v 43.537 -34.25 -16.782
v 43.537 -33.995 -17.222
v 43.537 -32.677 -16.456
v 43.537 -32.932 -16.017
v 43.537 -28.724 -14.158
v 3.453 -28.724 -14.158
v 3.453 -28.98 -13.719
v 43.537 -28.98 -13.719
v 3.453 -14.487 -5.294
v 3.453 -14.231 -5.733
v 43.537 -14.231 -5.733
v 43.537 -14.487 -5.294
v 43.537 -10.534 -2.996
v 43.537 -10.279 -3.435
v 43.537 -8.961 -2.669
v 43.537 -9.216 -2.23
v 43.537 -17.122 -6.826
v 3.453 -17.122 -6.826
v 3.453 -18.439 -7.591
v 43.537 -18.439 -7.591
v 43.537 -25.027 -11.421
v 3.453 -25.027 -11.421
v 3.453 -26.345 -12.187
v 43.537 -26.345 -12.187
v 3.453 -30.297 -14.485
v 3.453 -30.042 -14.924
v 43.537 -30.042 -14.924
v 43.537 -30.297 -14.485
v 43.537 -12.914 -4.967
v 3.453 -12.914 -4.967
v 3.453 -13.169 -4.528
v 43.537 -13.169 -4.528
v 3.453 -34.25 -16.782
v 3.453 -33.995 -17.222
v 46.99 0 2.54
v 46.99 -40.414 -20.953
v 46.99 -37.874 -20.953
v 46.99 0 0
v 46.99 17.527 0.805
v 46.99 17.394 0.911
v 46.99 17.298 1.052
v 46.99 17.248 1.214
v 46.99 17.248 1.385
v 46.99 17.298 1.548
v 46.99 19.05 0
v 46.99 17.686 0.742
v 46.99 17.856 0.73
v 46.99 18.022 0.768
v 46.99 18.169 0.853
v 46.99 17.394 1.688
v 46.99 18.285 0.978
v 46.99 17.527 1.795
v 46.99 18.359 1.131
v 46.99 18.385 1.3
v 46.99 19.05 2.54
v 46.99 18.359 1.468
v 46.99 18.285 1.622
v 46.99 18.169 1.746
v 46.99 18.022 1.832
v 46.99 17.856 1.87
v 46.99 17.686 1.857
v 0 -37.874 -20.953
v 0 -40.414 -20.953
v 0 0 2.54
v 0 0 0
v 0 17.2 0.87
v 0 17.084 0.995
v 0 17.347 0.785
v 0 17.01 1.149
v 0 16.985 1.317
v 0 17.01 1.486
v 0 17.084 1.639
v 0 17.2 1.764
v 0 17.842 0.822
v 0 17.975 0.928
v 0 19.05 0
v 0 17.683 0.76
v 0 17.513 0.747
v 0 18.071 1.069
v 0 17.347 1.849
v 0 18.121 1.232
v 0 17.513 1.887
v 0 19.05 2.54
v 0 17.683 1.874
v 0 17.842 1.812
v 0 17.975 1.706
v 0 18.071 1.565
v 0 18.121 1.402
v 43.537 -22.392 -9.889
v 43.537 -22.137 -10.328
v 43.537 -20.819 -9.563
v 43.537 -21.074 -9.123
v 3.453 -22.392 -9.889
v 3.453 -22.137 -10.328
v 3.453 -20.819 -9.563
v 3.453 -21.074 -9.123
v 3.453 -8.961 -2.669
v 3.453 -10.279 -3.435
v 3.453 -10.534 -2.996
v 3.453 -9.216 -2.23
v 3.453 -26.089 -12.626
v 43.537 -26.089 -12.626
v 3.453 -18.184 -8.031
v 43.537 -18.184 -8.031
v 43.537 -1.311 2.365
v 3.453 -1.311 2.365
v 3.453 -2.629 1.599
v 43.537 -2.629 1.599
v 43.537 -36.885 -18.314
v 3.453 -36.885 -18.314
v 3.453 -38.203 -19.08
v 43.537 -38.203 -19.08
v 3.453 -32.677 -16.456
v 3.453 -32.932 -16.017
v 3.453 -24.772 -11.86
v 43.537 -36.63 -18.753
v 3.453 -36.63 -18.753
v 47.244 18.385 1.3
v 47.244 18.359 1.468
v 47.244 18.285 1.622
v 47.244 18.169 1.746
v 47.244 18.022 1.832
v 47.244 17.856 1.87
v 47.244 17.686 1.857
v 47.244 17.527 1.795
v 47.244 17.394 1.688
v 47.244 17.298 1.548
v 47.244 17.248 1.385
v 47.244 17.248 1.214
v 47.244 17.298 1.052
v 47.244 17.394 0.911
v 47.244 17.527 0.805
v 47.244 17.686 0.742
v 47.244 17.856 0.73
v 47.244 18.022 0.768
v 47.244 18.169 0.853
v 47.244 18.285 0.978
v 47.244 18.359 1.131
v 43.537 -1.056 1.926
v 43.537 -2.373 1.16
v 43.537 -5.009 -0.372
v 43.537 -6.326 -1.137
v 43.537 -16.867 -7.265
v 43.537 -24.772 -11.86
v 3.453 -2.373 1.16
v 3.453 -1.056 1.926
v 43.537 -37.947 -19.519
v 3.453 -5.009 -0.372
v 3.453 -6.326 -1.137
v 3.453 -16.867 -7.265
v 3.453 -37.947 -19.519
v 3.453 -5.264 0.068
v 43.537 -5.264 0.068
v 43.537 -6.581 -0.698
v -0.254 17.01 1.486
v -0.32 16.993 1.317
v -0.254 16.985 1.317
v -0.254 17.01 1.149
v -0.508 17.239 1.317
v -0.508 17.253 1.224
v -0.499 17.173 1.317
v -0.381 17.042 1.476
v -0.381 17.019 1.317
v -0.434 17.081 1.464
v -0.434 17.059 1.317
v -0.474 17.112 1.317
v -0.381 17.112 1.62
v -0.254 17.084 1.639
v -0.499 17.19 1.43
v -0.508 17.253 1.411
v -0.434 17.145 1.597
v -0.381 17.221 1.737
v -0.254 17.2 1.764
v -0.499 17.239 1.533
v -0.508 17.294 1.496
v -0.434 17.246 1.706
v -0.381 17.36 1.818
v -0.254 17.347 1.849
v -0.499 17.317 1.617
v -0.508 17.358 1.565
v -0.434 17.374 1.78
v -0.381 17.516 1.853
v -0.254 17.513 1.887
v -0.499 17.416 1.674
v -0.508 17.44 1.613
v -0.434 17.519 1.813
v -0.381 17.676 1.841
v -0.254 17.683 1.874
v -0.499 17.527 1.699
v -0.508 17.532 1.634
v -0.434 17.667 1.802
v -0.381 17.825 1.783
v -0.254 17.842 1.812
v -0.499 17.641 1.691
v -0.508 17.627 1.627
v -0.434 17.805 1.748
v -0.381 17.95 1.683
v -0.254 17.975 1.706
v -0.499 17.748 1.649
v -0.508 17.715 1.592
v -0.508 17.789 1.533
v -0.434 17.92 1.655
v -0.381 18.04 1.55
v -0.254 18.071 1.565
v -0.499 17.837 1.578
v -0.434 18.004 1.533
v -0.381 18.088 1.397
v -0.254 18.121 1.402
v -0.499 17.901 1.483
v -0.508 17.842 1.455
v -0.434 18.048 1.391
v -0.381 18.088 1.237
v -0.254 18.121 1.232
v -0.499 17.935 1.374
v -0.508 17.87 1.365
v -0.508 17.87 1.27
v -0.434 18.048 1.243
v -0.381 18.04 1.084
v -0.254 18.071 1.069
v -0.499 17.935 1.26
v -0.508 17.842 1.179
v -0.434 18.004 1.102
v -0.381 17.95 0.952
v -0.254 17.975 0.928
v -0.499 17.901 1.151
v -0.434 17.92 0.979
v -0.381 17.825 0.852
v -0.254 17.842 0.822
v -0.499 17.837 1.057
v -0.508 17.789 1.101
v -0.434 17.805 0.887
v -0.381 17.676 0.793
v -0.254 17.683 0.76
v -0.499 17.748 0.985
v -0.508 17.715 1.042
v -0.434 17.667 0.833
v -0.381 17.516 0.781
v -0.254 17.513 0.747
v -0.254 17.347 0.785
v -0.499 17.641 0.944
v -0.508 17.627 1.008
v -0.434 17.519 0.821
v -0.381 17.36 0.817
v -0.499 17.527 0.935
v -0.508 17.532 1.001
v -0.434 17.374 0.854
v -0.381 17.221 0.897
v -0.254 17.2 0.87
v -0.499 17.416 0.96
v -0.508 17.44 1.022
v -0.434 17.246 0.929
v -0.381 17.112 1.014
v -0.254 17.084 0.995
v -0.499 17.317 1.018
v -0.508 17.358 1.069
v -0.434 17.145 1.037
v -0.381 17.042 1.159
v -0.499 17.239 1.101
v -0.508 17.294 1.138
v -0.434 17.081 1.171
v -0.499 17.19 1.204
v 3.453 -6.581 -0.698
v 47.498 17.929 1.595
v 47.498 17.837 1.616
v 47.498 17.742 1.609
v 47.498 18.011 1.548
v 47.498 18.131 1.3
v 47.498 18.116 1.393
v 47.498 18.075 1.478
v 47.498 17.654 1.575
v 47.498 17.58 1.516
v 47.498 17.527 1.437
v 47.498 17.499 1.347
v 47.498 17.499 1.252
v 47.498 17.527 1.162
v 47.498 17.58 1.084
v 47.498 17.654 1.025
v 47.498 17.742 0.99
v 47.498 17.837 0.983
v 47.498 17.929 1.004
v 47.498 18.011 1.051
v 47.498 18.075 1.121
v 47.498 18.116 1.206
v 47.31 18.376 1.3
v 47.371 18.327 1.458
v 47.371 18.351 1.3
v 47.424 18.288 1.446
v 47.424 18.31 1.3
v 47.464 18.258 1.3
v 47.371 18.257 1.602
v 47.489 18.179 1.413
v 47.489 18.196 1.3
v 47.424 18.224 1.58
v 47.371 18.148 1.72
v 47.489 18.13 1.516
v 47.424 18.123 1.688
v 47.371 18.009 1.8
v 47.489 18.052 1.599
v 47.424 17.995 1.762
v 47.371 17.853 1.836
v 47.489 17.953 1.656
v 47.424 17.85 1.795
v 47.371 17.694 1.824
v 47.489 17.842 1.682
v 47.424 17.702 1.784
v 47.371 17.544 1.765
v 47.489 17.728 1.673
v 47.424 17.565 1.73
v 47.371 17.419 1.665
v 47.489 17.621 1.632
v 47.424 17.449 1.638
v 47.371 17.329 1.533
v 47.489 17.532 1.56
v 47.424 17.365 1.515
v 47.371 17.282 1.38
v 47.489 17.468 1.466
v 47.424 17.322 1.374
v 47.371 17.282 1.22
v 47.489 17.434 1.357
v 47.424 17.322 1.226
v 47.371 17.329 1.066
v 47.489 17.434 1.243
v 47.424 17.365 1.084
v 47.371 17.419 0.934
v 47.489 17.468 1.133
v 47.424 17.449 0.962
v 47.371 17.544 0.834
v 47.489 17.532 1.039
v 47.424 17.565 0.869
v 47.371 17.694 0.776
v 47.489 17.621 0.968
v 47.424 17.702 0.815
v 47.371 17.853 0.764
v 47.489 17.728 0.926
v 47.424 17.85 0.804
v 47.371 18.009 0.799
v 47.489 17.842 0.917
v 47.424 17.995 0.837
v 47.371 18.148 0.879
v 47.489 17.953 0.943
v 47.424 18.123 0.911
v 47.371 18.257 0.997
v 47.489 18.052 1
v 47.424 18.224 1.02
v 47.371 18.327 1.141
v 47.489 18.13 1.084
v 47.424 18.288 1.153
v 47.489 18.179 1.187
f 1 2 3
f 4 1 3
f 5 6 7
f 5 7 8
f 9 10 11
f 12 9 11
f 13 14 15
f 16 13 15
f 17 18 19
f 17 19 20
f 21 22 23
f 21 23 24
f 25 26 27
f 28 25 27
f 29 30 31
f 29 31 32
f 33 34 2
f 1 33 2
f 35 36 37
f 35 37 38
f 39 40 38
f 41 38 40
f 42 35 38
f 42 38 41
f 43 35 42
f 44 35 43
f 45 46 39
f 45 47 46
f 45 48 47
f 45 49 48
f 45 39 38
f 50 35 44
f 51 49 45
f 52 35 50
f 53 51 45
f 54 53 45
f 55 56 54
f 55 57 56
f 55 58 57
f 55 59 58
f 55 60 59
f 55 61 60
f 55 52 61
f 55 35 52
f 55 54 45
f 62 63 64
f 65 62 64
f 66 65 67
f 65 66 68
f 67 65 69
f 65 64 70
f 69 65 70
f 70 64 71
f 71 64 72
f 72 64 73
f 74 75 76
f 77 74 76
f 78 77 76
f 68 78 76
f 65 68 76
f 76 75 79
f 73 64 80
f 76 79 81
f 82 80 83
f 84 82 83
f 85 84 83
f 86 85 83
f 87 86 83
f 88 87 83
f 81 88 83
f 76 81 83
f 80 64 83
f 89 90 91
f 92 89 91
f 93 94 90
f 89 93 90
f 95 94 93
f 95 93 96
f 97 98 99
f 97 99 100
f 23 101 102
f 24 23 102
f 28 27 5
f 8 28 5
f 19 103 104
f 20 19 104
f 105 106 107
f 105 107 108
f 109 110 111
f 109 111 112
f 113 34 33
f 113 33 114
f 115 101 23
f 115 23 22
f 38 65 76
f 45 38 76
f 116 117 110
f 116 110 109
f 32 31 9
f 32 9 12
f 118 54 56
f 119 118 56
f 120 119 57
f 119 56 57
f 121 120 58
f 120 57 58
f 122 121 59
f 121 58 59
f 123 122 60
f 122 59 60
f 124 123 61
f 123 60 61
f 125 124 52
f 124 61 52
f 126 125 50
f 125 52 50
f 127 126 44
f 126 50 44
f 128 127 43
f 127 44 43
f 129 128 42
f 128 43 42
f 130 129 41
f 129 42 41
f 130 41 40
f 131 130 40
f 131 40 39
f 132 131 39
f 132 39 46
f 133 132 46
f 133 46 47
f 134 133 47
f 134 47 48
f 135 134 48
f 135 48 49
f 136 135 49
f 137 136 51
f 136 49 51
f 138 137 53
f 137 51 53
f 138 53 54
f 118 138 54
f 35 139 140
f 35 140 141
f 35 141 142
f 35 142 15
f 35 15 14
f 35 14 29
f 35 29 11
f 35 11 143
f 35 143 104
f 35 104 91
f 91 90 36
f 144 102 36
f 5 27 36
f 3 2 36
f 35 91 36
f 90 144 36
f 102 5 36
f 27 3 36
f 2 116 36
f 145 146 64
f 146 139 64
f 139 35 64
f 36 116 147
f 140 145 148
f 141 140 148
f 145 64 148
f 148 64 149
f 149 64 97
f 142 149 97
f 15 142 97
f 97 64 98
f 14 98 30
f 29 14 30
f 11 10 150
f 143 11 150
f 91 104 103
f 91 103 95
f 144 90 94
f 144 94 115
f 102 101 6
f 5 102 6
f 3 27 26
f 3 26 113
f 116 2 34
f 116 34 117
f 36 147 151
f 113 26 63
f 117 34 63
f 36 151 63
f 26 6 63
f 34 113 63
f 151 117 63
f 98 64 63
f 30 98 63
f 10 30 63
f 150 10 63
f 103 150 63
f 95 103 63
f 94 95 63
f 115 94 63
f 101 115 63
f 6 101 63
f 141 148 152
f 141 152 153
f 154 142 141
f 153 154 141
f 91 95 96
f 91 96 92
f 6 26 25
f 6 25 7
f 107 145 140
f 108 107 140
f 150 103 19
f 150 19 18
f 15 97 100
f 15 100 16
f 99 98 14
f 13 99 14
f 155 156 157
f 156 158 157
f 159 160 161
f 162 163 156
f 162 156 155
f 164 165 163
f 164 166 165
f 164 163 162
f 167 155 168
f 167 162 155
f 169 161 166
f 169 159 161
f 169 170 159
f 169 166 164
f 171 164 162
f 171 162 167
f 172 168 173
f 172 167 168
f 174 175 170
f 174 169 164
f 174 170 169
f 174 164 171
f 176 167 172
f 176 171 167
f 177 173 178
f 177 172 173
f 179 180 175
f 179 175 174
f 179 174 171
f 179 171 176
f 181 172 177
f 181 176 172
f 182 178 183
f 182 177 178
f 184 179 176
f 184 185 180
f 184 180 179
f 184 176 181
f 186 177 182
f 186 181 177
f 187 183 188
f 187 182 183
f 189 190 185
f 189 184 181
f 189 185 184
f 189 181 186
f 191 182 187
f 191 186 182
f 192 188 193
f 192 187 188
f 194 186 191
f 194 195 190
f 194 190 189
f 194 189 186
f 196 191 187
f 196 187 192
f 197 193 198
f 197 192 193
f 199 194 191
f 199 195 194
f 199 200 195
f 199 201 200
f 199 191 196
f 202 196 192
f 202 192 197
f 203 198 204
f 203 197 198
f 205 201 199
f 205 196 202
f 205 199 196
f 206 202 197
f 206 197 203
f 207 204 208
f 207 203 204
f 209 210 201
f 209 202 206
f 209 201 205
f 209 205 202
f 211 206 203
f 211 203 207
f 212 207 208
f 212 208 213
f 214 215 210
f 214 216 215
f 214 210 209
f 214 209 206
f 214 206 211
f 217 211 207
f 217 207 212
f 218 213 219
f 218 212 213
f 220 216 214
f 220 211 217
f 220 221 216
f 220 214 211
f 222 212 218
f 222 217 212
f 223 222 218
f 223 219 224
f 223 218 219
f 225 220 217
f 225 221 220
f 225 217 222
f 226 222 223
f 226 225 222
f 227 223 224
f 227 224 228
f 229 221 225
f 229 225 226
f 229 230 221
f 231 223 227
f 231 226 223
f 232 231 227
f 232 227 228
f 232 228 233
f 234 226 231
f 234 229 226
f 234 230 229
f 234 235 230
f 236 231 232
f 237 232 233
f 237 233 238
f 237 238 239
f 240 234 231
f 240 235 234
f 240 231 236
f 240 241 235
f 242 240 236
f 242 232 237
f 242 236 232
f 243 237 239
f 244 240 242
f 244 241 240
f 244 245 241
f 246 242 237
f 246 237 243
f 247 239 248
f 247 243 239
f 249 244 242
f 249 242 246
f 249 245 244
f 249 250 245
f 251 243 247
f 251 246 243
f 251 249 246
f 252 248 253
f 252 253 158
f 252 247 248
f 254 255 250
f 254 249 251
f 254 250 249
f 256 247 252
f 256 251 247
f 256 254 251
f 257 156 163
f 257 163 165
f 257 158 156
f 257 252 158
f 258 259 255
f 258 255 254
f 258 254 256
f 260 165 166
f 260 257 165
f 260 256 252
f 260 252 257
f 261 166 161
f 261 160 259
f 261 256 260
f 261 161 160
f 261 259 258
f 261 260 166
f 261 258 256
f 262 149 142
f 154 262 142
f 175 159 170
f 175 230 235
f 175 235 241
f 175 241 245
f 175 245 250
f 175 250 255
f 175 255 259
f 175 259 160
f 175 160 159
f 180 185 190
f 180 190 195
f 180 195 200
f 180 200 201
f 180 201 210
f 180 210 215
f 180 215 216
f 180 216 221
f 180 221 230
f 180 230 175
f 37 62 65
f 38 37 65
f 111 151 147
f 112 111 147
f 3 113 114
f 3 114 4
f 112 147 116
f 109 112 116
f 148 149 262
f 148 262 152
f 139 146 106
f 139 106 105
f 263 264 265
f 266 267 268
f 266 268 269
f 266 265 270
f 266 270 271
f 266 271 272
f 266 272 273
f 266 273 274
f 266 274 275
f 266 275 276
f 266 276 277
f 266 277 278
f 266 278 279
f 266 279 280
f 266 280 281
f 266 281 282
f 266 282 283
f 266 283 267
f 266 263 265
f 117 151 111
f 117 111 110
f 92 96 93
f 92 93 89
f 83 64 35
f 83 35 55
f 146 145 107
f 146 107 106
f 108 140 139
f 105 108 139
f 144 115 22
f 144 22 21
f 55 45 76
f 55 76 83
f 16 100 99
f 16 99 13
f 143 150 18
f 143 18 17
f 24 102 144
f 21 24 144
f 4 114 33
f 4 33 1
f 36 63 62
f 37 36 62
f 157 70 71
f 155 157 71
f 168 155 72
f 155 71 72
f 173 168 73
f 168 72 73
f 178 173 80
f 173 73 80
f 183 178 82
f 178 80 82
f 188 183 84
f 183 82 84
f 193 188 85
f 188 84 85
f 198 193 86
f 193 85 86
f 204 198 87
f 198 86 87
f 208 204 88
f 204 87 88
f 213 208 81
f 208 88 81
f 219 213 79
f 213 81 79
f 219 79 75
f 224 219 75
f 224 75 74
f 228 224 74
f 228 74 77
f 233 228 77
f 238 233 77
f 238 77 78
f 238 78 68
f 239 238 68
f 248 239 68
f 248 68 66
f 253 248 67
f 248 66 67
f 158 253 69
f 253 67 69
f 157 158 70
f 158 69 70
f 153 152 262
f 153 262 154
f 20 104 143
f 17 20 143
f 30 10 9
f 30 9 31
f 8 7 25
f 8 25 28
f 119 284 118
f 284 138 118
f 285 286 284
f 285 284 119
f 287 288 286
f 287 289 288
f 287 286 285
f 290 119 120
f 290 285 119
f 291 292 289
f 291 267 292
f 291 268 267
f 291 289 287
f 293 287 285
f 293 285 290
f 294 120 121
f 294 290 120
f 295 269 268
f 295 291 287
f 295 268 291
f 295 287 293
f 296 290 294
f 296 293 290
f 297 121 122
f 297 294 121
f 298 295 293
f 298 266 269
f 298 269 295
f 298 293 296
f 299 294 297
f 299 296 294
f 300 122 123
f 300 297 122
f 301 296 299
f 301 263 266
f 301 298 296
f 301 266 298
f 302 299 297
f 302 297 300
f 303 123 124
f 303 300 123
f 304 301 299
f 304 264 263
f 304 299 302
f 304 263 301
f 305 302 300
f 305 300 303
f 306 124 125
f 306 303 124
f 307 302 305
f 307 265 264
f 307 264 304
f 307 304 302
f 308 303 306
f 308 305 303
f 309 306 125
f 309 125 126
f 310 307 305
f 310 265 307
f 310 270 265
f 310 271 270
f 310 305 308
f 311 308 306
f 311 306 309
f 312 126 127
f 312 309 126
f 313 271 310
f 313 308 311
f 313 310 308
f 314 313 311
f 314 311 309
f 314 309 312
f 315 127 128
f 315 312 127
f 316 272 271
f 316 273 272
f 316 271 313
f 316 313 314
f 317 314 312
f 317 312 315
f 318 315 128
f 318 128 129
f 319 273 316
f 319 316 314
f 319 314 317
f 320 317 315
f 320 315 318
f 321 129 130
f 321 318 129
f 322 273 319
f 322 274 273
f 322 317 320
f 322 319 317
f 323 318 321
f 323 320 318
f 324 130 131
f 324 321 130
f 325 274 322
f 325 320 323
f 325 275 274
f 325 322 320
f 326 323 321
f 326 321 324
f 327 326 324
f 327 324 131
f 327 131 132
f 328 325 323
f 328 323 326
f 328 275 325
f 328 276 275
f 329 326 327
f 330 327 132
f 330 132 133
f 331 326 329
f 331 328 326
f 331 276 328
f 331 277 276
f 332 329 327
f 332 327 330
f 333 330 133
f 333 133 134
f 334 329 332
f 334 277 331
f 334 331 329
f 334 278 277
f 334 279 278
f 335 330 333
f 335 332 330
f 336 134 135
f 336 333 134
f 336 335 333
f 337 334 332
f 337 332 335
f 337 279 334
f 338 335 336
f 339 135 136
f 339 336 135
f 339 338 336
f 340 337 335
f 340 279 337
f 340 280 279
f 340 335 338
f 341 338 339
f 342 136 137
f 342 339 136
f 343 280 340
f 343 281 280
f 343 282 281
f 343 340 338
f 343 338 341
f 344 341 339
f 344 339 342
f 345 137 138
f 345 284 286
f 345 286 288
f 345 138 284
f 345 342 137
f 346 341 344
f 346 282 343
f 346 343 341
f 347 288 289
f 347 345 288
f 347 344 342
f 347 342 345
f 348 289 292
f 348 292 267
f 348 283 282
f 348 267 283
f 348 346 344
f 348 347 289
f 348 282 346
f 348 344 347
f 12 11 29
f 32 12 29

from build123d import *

# Parameters (mm, degrees)
F0_W     = 19.05
F0_H     = 2.54
F1_DEPTH = 46.99
F2_W     = 40.0845290253
F2_H     = 1.524
F3_DEPTH = 0.508
F4_R     = 0.57150051
F5_DEPTH = 0.508
F6_R     = 0.254
F7_R     = 0.5715
F8_DEPTH = 0.508
F9_R     = 0.254


with BuildPart() as f1:
    # F0 (on Right) → F1 (new body)
    with BuildSketch(Plane.YZ):
        with Locations((9.525, 1.27)):
            Rectangle(F0_W, F0_H)
        Polygon((0, 0), (0, 2.54), (-40.4138714075, -20.9532231092), (-37.8738714075, -20.9532231092), align=None)
    extrude(amount=F1_DEPTH)

    # F2 (on face) → F3 (join)
    with BuildSketch(Plane(origin=(0, -1.1036035582, 1.8984577841), x_dir=(1, 0, 0), z_dir=(0, -0.5025690754, 0.8645370579))):
        with Locations((23.495, -0.7067697006)):
            Rectangle(F2_W, F2_H)
        with Locations((23.495, -5.2787697006)):
            Rectangle(F2_W, F2_H)
        with Locations((23.495, -9.8507697006)):
            Rectangle(F2_W, F2_H)
        with Locations((23.495, -14.4227697006)):
            Rectangle(F2_W, F2_H)
        with Locations((23.495, -18.9947697006)):
            Rectangle(F2_W, F2_H)
        with Locations((23.495, -23.5667697006)):
            Rectangle(F2_W, F2_H)
        with Locations((23.495, -28.1387697006)):
            Rectangle(F2_W, F2_H)
        with Locations((23.495, -32.7107697006)):
            Rectangle(F2_W, F2_H)
        with Locations((23.495, -37.2827697006)):
            Rectangle(F2_W, F2_H)
        with Locations((23.495, -41.8547697006)):
            Rectangle(F2_W, F2_H)
    extrude(amount=F3_DEPTH)

    # F4 (on face) → F5 (join)
    with BuildSketch(Plane(origin=(0, 0, 0), x_dir=(0, -1, 0), z_dir=(-1, 0, 0))):
        with Locations((-17.5560880452, 1.3172084)):
            Circle(F4_R)
    extrude(amount=F5_DEPTH)

    # F6
    f6_edges = [f1.edges().sort_by_distance(p)[0] for p in [
        (-0.508, 18.127589, 1.317208),
    ]]
    fillet(f6_edges, radius=F6_R)

    # F7 (on face) → F8 (join)
    with BuildSketch(Plane.YZ.offset(46.99)):
        with Locations((17.8131051362, 1.299622003)):
            Circle(F7_R)
    extrude(amount=F8_DEPTH)

    # F9
    f9_edges = [f1.edges().sort_by_distance(p)[0] for p in [
        (47.498, 17.241605, 1.299622),
    ]]
    fillet(f9_edges, radius=F9_R)


solid = f1.part
